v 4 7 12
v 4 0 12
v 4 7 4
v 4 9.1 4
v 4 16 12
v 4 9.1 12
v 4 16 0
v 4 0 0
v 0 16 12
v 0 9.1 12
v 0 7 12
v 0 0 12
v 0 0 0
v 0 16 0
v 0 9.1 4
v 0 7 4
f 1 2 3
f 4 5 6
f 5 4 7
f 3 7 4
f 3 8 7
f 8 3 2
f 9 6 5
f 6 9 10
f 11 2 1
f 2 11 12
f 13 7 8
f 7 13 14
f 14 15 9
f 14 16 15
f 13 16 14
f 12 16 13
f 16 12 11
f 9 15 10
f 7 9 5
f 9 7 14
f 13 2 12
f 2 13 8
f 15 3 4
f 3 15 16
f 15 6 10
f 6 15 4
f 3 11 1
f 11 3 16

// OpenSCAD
difference(){//overall size
translate([0,0,0])cube ([4,16,12]);
translate([-1,7,4])cube([10,2.1,9]);
}
